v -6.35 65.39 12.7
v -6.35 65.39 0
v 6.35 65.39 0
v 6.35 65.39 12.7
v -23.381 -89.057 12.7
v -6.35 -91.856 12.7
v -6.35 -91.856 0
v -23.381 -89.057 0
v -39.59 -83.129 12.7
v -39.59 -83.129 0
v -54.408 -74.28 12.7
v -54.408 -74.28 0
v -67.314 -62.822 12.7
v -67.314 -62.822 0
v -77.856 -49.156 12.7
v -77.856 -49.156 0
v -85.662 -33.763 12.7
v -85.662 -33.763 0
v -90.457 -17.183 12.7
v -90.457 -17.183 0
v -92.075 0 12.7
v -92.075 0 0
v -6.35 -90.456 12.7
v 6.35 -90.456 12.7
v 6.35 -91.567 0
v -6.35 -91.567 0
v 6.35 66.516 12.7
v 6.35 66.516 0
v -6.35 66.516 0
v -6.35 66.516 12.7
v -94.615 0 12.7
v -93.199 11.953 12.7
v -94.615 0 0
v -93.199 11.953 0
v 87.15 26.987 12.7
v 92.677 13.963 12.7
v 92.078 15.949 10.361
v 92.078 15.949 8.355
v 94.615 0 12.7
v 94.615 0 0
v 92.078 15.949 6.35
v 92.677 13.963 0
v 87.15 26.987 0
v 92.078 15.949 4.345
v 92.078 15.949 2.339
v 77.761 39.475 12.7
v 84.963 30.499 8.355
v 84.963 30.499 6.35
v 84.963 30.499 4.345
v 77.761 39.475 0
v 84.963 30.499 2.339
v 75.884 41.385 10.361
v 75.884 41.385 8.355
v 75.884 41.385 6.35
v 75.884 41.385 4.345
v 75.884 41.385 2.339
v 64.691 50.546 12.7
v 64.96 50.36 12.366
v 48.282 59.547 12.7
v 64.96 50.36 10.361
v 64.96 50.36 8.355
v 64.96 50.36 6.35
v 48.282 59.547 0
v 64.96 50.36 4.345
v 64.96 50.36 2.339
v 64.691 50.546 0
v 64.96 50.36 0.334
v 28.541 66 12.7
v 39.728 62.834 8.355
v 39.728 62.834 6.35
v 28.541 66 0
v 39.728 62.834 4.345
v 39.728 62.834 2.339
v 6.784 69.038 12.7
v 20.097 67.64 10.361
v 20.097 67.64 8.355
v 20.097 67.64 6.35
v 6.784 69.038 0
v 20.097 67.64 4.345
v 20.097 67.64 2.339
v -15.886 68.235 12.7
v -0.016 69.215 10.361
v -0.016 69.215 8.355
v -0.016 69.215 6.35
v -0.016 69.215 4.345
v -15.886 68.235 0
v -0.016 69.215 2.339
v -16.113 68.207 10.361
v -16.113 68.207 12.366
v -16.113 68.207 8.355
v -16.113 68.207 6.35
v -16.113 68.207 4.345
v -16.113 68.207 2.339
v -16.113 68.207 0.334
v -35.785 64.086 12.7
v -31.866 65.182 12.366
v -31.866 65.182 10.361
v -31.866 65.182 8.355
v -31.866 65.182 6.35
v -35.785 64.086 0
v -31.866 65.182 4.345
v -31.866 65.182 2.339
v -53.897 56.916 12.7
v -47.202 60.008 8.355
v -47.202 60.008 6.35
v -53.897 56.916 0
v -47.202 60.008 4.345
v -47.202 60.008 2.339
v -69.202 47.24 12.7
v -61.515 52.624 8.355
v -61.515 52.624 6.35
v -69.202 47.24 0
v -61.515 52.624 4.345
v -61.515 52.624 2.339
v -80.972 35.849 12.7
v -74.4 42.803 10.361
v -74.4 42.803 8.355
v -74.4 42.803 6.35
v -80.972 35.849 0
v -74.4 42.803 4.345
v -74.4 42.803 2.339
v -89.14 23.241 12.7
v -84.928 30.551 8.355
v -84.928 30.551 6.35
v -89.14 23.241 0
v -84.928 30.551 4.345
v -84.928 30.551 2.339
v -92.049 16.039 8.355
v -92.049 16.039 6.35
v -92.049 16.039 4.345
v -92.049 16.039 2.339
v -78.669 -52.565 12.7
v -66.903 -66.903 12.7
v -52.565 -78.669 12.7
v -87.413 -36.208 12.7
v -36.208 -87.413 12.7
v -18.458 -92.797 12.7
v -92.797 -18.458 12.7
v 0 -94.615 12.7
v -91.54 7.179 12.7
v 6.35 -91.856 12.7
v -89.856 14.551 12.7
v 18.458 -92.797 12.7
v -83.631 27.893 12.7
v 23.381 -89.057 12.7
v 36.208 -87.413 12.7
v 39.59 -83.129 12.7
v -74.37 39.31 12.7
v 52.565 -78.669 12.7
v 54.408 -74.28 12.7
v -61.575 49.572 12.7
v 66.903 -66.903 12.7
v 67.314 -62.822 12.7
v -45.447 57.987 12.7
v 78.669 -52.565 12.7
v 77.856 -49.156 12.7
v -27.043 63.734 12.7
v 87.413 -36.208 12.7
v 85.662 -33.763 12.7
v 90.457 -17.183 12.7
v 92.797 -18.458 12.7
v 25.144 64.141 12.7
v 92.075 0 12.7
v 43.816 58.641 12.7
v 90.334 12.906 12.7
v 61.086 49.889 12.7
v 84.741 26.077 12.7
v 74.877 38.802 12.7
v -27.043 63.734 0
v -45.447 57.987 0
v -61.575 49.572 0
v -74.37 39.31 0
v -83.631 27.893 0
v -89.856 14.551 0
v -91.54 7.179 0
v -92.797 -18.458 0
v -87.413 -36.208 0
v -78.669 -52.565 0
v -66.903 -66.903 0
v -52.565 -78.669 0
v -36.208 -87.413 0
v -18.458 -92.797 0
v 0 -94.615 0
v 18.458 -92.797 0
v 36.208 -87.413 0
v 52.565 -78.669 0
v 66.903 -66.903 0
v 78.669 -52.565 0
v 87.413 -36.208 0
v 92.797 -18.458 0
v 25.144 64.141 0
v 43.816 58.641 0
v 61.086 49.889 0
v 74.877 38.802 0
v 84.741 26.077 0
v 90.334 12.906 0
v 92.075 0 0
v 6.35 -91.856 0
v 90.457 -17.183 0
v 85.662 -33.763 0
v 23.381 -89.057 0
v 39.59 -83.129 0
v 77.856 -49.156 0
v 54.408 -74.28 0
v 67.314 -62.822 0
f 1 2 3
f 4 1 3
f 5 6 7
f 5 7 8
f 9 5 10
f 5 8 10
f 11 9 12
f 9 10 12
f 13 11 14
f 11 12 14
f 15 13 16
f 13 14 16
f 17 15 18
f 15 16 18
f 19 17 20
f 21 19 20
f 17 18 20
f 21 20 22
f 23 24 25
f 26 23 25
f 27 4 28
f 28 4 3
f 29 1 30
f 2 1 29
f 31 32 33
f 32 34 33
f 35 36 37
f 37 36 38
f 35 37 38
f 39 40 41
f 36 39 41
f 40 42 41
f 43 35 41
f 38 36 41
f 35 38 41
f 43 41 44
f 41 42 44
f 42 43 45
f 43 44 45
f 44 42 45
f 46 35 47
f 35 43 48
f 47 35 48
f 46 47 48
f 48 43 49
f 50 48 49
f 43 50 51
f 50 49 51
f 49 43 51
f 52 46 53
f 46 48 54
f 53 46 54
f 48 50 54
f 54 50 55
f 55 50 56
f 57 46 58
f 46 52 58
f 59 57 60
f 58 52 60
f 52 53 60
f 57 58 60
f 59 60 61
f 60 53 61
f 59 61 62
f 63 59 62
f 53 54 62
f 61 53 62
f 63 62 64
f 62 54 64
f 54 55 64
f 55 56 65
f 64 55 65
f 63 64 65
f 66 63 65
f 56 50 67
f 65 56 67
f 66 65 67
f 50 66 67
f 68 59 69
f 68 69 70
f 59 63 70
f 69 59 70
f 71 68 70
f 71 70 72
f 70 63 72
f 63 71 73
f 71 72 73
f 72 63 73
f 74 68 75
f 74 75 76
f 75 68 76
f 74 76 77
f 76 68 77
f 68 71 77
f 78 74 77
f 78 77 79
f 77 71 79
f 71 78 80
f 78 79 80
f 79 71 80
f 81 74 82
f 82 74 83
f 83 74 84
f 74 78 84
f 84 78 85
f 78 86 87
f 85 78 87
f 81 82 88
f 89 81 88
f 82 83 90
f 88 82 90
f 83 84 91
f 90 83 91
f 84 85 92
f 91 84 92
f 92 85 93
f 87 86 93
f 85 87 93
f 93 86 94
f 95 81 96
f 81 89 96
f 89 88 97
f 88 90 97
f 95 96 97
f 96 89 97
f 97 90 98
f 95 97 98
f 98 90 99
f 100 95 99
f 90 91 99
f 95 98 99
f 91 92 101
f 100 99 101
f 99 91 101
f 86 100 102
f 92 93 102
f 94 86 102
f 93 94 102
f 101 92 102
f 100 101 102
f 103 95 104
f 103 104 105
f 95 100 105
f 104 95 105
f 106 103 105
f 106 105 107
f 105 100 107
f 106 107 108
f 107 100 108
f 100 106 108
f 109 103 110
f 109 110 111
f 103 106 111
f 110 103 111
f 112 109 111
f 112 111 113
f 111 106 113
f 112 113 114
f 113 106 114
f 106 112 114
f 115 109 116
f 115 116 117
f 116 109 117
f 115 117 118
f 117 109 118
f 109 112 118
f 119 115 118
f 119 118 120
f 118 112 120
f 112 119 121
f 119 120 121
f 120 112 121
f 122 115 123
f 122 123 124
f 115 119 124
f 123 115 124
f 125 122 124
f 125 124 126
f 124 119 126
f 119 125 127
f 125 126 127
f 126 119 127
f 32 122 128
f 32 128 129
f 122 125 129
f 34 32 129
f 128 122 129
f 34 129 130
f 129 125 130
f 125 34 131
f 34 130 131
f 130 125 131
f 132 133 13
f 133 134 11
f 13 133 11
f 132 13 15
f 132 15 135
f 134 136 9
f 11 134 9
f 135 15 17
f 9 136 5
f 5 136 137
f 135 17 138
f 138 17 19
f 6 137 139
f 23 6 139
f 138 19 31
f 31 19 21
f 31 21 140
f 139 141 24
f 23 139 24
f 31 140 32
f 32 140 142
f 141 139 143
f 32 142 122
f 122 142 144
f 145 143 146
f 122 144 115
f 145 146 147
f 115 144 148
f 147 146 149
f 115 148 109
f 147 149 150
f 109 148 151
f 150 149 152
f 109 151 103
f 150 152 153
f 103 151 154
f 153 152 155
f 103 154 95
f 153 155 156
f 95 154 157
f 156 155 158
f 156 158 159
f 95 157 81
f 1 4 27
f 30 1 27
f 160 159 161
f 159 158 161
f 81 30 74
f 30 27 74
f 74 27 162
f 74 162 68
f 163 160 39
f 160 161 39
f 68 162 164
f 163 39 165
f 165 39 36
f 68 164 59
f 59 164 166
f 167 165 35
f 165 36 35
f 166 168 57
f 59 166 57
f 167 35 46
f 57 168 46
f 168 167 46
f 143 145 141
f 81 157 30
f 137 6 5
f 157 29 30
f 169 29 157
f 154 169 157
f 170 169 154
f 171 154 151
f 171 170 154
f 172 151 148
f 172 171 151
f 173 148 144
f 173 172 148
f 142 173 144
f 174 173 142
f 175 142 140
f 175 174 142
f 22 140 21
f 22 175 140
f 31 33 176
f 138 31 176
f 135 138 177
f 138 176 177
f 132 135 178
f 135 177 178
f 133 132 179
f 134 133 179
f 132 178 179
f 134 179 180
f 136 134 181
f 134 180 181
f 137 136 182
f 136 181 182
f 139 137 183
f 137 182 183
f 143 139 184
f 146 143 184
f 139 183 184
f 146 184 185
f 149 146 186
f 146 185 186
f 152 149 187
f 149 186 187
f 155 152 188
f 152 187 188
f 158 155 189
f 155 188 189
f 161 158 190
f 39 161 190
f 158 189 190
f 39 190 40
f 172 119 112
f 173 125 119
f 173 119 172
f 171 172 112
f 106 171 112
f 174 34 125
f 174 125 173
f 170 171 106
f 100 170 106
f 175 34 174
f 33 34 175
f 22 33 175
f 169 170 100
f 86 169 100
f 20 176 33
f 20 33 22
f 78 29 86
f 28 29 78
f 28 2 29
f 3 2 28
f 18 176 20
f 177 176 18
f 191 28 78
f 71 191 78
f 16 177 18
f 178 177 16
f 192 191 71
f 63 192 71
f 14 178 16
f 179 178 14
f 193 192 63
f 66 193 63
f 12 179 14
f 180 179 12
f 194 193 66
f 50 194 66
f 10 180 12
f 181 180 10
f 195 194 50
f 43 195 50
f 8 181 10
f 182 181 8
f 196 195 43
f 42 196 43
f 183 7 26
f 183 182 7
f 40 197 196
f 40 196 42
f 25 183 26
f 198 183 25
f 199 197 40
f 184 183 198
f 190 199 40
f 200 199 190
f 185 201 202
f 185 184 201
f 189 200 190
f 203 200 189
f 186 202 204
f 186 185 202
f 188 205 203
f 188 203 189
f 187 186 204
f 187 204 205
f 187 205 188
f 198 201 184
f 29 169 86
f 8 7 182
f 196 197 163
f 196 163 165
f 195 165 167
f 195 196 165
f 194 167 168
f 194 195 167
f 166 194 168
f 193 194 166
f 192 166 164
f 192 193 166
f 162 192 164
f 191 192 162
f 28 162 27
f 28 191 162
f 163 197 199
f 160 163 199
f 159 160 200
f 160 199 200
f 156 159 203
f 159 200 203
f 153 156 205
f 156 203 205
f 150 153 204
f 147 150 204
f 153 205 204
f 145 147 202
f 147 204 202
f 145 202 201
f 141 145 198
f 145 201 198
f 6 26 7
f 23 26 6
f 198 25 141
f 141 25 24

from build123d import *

# Parameters (mm, degrees)
EXTRUDE_THIN4_DEPTH  = 12.7
BOSS_EXTRUDE4_START  = -1.285403
SKETCH9_W            = 12.7
SKETCH9_H            = 12.7
BOSS_EXTRUDE4_DEPTH  = 1.285403
SKETCH18_W           = 12.7
SKETCH18_H           = 12.7
BOSS_EXTRUDE11_DEPTH = 0.508
BOSS_EXTRUDE12_DEPTH = 12.7


# Read off the part's stored shape, not the designer's step: Extrude-Thin4
with BuildPart() as part:
    # Extrude-Thin4 outline → Extrude-Thin4 (new body)
    with BuildSketch(Plane.XY):
        with BuildLine():
            ThreePointArc((-94.615, 0), (0, -94.615), (94.615, 0))
            add(Edge.make_bspline(
                [(94.615, 0), (94.615, 2.73261432), (94.395490525, 5.426625193), (93.54401895, 10.742112058), (92.911931877, 13.363566074), (91.660435042, 17.242396406), (91.191270419, 18.528568166), (90.168762341, 21.043712381), (89.614022449, 22.277697693), (87.826365425, 25.912701016), (86.470442882, 28.247000696), (84.585863218, 31.06199447), (84.199428542, 31.619830243), (83.407778518, 32.725315123), (83.001887397, 33.273825859), (81.762898011, 34.895827175), (80.90808464, 35.946702496), (78.263231539, 39.014343992), (76.393087657, 40.946452093), (72.461804782, 44.60881511), (70.400552775, 46.338950587), (67.175816993, 48.793743065), (66.078704621, 49.588544685), (63.841229223, 51.13243847), (62.707886547, 51.876655554), (59.272732326, 54.027034208), (56.933188029, 55.353065789), (52.164586894, 57.810404839), (49.735490844, 58.941627007), (44.793689995, 61.022190247), (42.280964323, 61.97148591), (38.451744208, 63.264620094), (37.165298005, 63.673825065), (34.572564534, 64.449073075), (33.26500114, 64.81537478), (26.721531086, 66.528934319), (21.437450815, 67.535478954), (10.778679303, 68.879054675), (5.403934101, 69.215687043), (-2.726662378, 69.214654911), (-5.424789063, 69.129445108), (-10.790309058, 68.792778457), (-13.458884287, 68.541316332), (-21.421997842, 67.537204644), (-26.674282833, 66.536932479), (-34.461856375, 64.504081304), (-37.042489287, 63.737239618), (-40.888891672, 62.443121275), (-42.169219974, 61.986801748), (-44.70335009, 61.030836829), (-45.958505365, 60.530833267), (-52.173703529, 57.918806786), (-56.954079496, 55.474581033), (-63.79472601, 51.198227458), (-66.019580064, 49.670413346), (-69.263545781, 47.206152749), (-70.327786152, 46.356755825), (-72.401450601, 44.615309625), (-73.413550097, 43.721273672), (-76.37310693, 40.9668298), (-78.244137425, 39.034382611), (-81.76209758, 34.95825275), (-83.409211697, 32.814743947), (-85.687772675, 29.418399352), (-86.408457843, 28.265769226), (-87.766179903, 25.925109257), (-88.403920063, 24.736041385), (-90.190013765, 21.110908862), (-91.211831115, 18.617184418), (-92.257768409, 15.394614809), (-92.455342881, 14.744809102), (-92.826557707, 13.43429143), (-93.000389748, 12.772621628), (-93.481472485, 10.785340575), (-93.749581467, 9.453635256), (-94.395330303, 5.437869137), (-94.615, 2.733237345), (-94.615, 0)],
                knots=[0, 0, 0, 0, 0.03125, 0.03125, 0.0625, 0.0625, 0.078125, 0.078125, 0.09375, 0.09375, 0.125, 0.125, 0.1328125, 0.1328125, 0.140625, 0.140625, 0.15625, 0.15625, 0.1875, 0.1875, 0.21875, 0.21875, 0.234375, 0.234375, 0.25, 0.25, 0.28125, 0.28125, 0.3125, 0.3125, 0.34375, 0.34375, 0.359375, 0.359375, 0.375, 0.375, 0.4375, 0.4375, 0.5, 0.5, 0.53125, 0.53125, 0.5625, 0.5625, 0.625, 0.625, 0.65625, 0.65625, 0.671875, 0.671875, 0.6875, 0.6875, 0.75, 0.75, 0.78125, 0.78125, 0.796875, 0.796875, 0.8125, 0.8125, 0.84375, 0.84375, 0.875, 0.875, 0.890625, 0.890625, 0.90625, 0.90625, 0.9375, 0.9375, 0.9453125, 0.9453125, 0.953125, 0.953125, 0.96875, 0.96875, 1, 1, 1, 1], degree=3))
        make_face()
        with BuildLine():
            add(Edge.make_bspline(
                [(92.075, 0), (92.075, 66.675), (0, 66.675), (-92.075, 66.675), (-92.075, 0)],
                knots=[0, 0, 0, 1.570796327, 1.570796327, 3.141592654, 3.141592654, 3.141592654], degree=2, weights=[1, 0.707106781, 1, 0.707106781, 1]))
            ThreePointArc((92.075, 0), (0, -92.075), (-92.075, 0))
        make_face(mode=Mode.SUBTRACT)
    extrude(amount=EXTRUDE_THIN4_DEPTH)

    # Sketch9 → Boss-Extrude4 (add)
    with BuildSketch(Plane(origin=(-6.3332e-05, 66.675, 0), x_dir=(0.999999999999549, 9.498577862699883e-07, 0), z_dir=(-9.498577862699883e-07, 0.999999999999549, 0)).offset(BOSS_EXTRUDE4_START)):
        with Locations((0, -6.35)):
            Rectangle(SKETCH9_W, SKETCH9_H)
    extrude(amount=BOSS_EXTRUDE4_DEPTH)

    # Sketch18 → Boss-Extrude11 (add)
    with BuildSketch(Plane(origin=(0, -92.075, 0), x_dir=(-1, 0, 0), z_dir=(0, -1, 0))):
        with Locations((0, -6.35)):
            Rectangle(SKETCH18_W, SKETCH18_H)
    extrude(amount=-BOSS_EXTRUDE11_DEPTH)

    # Sketch19 → Boss-Extrude12 (add)
    with BuildSketch(Plane(origin=(6.35, 0, 0), x_dir=(0, 0, -1), z_dir=(1, 0, 0))):
        Polygon((-12.7, -91.567), (-12.7, -90.455893973), (0, -91.567), align=None)
    extrude(amount=-BOSS_EXTRUDE12_DEPTH)


solid = part.part
